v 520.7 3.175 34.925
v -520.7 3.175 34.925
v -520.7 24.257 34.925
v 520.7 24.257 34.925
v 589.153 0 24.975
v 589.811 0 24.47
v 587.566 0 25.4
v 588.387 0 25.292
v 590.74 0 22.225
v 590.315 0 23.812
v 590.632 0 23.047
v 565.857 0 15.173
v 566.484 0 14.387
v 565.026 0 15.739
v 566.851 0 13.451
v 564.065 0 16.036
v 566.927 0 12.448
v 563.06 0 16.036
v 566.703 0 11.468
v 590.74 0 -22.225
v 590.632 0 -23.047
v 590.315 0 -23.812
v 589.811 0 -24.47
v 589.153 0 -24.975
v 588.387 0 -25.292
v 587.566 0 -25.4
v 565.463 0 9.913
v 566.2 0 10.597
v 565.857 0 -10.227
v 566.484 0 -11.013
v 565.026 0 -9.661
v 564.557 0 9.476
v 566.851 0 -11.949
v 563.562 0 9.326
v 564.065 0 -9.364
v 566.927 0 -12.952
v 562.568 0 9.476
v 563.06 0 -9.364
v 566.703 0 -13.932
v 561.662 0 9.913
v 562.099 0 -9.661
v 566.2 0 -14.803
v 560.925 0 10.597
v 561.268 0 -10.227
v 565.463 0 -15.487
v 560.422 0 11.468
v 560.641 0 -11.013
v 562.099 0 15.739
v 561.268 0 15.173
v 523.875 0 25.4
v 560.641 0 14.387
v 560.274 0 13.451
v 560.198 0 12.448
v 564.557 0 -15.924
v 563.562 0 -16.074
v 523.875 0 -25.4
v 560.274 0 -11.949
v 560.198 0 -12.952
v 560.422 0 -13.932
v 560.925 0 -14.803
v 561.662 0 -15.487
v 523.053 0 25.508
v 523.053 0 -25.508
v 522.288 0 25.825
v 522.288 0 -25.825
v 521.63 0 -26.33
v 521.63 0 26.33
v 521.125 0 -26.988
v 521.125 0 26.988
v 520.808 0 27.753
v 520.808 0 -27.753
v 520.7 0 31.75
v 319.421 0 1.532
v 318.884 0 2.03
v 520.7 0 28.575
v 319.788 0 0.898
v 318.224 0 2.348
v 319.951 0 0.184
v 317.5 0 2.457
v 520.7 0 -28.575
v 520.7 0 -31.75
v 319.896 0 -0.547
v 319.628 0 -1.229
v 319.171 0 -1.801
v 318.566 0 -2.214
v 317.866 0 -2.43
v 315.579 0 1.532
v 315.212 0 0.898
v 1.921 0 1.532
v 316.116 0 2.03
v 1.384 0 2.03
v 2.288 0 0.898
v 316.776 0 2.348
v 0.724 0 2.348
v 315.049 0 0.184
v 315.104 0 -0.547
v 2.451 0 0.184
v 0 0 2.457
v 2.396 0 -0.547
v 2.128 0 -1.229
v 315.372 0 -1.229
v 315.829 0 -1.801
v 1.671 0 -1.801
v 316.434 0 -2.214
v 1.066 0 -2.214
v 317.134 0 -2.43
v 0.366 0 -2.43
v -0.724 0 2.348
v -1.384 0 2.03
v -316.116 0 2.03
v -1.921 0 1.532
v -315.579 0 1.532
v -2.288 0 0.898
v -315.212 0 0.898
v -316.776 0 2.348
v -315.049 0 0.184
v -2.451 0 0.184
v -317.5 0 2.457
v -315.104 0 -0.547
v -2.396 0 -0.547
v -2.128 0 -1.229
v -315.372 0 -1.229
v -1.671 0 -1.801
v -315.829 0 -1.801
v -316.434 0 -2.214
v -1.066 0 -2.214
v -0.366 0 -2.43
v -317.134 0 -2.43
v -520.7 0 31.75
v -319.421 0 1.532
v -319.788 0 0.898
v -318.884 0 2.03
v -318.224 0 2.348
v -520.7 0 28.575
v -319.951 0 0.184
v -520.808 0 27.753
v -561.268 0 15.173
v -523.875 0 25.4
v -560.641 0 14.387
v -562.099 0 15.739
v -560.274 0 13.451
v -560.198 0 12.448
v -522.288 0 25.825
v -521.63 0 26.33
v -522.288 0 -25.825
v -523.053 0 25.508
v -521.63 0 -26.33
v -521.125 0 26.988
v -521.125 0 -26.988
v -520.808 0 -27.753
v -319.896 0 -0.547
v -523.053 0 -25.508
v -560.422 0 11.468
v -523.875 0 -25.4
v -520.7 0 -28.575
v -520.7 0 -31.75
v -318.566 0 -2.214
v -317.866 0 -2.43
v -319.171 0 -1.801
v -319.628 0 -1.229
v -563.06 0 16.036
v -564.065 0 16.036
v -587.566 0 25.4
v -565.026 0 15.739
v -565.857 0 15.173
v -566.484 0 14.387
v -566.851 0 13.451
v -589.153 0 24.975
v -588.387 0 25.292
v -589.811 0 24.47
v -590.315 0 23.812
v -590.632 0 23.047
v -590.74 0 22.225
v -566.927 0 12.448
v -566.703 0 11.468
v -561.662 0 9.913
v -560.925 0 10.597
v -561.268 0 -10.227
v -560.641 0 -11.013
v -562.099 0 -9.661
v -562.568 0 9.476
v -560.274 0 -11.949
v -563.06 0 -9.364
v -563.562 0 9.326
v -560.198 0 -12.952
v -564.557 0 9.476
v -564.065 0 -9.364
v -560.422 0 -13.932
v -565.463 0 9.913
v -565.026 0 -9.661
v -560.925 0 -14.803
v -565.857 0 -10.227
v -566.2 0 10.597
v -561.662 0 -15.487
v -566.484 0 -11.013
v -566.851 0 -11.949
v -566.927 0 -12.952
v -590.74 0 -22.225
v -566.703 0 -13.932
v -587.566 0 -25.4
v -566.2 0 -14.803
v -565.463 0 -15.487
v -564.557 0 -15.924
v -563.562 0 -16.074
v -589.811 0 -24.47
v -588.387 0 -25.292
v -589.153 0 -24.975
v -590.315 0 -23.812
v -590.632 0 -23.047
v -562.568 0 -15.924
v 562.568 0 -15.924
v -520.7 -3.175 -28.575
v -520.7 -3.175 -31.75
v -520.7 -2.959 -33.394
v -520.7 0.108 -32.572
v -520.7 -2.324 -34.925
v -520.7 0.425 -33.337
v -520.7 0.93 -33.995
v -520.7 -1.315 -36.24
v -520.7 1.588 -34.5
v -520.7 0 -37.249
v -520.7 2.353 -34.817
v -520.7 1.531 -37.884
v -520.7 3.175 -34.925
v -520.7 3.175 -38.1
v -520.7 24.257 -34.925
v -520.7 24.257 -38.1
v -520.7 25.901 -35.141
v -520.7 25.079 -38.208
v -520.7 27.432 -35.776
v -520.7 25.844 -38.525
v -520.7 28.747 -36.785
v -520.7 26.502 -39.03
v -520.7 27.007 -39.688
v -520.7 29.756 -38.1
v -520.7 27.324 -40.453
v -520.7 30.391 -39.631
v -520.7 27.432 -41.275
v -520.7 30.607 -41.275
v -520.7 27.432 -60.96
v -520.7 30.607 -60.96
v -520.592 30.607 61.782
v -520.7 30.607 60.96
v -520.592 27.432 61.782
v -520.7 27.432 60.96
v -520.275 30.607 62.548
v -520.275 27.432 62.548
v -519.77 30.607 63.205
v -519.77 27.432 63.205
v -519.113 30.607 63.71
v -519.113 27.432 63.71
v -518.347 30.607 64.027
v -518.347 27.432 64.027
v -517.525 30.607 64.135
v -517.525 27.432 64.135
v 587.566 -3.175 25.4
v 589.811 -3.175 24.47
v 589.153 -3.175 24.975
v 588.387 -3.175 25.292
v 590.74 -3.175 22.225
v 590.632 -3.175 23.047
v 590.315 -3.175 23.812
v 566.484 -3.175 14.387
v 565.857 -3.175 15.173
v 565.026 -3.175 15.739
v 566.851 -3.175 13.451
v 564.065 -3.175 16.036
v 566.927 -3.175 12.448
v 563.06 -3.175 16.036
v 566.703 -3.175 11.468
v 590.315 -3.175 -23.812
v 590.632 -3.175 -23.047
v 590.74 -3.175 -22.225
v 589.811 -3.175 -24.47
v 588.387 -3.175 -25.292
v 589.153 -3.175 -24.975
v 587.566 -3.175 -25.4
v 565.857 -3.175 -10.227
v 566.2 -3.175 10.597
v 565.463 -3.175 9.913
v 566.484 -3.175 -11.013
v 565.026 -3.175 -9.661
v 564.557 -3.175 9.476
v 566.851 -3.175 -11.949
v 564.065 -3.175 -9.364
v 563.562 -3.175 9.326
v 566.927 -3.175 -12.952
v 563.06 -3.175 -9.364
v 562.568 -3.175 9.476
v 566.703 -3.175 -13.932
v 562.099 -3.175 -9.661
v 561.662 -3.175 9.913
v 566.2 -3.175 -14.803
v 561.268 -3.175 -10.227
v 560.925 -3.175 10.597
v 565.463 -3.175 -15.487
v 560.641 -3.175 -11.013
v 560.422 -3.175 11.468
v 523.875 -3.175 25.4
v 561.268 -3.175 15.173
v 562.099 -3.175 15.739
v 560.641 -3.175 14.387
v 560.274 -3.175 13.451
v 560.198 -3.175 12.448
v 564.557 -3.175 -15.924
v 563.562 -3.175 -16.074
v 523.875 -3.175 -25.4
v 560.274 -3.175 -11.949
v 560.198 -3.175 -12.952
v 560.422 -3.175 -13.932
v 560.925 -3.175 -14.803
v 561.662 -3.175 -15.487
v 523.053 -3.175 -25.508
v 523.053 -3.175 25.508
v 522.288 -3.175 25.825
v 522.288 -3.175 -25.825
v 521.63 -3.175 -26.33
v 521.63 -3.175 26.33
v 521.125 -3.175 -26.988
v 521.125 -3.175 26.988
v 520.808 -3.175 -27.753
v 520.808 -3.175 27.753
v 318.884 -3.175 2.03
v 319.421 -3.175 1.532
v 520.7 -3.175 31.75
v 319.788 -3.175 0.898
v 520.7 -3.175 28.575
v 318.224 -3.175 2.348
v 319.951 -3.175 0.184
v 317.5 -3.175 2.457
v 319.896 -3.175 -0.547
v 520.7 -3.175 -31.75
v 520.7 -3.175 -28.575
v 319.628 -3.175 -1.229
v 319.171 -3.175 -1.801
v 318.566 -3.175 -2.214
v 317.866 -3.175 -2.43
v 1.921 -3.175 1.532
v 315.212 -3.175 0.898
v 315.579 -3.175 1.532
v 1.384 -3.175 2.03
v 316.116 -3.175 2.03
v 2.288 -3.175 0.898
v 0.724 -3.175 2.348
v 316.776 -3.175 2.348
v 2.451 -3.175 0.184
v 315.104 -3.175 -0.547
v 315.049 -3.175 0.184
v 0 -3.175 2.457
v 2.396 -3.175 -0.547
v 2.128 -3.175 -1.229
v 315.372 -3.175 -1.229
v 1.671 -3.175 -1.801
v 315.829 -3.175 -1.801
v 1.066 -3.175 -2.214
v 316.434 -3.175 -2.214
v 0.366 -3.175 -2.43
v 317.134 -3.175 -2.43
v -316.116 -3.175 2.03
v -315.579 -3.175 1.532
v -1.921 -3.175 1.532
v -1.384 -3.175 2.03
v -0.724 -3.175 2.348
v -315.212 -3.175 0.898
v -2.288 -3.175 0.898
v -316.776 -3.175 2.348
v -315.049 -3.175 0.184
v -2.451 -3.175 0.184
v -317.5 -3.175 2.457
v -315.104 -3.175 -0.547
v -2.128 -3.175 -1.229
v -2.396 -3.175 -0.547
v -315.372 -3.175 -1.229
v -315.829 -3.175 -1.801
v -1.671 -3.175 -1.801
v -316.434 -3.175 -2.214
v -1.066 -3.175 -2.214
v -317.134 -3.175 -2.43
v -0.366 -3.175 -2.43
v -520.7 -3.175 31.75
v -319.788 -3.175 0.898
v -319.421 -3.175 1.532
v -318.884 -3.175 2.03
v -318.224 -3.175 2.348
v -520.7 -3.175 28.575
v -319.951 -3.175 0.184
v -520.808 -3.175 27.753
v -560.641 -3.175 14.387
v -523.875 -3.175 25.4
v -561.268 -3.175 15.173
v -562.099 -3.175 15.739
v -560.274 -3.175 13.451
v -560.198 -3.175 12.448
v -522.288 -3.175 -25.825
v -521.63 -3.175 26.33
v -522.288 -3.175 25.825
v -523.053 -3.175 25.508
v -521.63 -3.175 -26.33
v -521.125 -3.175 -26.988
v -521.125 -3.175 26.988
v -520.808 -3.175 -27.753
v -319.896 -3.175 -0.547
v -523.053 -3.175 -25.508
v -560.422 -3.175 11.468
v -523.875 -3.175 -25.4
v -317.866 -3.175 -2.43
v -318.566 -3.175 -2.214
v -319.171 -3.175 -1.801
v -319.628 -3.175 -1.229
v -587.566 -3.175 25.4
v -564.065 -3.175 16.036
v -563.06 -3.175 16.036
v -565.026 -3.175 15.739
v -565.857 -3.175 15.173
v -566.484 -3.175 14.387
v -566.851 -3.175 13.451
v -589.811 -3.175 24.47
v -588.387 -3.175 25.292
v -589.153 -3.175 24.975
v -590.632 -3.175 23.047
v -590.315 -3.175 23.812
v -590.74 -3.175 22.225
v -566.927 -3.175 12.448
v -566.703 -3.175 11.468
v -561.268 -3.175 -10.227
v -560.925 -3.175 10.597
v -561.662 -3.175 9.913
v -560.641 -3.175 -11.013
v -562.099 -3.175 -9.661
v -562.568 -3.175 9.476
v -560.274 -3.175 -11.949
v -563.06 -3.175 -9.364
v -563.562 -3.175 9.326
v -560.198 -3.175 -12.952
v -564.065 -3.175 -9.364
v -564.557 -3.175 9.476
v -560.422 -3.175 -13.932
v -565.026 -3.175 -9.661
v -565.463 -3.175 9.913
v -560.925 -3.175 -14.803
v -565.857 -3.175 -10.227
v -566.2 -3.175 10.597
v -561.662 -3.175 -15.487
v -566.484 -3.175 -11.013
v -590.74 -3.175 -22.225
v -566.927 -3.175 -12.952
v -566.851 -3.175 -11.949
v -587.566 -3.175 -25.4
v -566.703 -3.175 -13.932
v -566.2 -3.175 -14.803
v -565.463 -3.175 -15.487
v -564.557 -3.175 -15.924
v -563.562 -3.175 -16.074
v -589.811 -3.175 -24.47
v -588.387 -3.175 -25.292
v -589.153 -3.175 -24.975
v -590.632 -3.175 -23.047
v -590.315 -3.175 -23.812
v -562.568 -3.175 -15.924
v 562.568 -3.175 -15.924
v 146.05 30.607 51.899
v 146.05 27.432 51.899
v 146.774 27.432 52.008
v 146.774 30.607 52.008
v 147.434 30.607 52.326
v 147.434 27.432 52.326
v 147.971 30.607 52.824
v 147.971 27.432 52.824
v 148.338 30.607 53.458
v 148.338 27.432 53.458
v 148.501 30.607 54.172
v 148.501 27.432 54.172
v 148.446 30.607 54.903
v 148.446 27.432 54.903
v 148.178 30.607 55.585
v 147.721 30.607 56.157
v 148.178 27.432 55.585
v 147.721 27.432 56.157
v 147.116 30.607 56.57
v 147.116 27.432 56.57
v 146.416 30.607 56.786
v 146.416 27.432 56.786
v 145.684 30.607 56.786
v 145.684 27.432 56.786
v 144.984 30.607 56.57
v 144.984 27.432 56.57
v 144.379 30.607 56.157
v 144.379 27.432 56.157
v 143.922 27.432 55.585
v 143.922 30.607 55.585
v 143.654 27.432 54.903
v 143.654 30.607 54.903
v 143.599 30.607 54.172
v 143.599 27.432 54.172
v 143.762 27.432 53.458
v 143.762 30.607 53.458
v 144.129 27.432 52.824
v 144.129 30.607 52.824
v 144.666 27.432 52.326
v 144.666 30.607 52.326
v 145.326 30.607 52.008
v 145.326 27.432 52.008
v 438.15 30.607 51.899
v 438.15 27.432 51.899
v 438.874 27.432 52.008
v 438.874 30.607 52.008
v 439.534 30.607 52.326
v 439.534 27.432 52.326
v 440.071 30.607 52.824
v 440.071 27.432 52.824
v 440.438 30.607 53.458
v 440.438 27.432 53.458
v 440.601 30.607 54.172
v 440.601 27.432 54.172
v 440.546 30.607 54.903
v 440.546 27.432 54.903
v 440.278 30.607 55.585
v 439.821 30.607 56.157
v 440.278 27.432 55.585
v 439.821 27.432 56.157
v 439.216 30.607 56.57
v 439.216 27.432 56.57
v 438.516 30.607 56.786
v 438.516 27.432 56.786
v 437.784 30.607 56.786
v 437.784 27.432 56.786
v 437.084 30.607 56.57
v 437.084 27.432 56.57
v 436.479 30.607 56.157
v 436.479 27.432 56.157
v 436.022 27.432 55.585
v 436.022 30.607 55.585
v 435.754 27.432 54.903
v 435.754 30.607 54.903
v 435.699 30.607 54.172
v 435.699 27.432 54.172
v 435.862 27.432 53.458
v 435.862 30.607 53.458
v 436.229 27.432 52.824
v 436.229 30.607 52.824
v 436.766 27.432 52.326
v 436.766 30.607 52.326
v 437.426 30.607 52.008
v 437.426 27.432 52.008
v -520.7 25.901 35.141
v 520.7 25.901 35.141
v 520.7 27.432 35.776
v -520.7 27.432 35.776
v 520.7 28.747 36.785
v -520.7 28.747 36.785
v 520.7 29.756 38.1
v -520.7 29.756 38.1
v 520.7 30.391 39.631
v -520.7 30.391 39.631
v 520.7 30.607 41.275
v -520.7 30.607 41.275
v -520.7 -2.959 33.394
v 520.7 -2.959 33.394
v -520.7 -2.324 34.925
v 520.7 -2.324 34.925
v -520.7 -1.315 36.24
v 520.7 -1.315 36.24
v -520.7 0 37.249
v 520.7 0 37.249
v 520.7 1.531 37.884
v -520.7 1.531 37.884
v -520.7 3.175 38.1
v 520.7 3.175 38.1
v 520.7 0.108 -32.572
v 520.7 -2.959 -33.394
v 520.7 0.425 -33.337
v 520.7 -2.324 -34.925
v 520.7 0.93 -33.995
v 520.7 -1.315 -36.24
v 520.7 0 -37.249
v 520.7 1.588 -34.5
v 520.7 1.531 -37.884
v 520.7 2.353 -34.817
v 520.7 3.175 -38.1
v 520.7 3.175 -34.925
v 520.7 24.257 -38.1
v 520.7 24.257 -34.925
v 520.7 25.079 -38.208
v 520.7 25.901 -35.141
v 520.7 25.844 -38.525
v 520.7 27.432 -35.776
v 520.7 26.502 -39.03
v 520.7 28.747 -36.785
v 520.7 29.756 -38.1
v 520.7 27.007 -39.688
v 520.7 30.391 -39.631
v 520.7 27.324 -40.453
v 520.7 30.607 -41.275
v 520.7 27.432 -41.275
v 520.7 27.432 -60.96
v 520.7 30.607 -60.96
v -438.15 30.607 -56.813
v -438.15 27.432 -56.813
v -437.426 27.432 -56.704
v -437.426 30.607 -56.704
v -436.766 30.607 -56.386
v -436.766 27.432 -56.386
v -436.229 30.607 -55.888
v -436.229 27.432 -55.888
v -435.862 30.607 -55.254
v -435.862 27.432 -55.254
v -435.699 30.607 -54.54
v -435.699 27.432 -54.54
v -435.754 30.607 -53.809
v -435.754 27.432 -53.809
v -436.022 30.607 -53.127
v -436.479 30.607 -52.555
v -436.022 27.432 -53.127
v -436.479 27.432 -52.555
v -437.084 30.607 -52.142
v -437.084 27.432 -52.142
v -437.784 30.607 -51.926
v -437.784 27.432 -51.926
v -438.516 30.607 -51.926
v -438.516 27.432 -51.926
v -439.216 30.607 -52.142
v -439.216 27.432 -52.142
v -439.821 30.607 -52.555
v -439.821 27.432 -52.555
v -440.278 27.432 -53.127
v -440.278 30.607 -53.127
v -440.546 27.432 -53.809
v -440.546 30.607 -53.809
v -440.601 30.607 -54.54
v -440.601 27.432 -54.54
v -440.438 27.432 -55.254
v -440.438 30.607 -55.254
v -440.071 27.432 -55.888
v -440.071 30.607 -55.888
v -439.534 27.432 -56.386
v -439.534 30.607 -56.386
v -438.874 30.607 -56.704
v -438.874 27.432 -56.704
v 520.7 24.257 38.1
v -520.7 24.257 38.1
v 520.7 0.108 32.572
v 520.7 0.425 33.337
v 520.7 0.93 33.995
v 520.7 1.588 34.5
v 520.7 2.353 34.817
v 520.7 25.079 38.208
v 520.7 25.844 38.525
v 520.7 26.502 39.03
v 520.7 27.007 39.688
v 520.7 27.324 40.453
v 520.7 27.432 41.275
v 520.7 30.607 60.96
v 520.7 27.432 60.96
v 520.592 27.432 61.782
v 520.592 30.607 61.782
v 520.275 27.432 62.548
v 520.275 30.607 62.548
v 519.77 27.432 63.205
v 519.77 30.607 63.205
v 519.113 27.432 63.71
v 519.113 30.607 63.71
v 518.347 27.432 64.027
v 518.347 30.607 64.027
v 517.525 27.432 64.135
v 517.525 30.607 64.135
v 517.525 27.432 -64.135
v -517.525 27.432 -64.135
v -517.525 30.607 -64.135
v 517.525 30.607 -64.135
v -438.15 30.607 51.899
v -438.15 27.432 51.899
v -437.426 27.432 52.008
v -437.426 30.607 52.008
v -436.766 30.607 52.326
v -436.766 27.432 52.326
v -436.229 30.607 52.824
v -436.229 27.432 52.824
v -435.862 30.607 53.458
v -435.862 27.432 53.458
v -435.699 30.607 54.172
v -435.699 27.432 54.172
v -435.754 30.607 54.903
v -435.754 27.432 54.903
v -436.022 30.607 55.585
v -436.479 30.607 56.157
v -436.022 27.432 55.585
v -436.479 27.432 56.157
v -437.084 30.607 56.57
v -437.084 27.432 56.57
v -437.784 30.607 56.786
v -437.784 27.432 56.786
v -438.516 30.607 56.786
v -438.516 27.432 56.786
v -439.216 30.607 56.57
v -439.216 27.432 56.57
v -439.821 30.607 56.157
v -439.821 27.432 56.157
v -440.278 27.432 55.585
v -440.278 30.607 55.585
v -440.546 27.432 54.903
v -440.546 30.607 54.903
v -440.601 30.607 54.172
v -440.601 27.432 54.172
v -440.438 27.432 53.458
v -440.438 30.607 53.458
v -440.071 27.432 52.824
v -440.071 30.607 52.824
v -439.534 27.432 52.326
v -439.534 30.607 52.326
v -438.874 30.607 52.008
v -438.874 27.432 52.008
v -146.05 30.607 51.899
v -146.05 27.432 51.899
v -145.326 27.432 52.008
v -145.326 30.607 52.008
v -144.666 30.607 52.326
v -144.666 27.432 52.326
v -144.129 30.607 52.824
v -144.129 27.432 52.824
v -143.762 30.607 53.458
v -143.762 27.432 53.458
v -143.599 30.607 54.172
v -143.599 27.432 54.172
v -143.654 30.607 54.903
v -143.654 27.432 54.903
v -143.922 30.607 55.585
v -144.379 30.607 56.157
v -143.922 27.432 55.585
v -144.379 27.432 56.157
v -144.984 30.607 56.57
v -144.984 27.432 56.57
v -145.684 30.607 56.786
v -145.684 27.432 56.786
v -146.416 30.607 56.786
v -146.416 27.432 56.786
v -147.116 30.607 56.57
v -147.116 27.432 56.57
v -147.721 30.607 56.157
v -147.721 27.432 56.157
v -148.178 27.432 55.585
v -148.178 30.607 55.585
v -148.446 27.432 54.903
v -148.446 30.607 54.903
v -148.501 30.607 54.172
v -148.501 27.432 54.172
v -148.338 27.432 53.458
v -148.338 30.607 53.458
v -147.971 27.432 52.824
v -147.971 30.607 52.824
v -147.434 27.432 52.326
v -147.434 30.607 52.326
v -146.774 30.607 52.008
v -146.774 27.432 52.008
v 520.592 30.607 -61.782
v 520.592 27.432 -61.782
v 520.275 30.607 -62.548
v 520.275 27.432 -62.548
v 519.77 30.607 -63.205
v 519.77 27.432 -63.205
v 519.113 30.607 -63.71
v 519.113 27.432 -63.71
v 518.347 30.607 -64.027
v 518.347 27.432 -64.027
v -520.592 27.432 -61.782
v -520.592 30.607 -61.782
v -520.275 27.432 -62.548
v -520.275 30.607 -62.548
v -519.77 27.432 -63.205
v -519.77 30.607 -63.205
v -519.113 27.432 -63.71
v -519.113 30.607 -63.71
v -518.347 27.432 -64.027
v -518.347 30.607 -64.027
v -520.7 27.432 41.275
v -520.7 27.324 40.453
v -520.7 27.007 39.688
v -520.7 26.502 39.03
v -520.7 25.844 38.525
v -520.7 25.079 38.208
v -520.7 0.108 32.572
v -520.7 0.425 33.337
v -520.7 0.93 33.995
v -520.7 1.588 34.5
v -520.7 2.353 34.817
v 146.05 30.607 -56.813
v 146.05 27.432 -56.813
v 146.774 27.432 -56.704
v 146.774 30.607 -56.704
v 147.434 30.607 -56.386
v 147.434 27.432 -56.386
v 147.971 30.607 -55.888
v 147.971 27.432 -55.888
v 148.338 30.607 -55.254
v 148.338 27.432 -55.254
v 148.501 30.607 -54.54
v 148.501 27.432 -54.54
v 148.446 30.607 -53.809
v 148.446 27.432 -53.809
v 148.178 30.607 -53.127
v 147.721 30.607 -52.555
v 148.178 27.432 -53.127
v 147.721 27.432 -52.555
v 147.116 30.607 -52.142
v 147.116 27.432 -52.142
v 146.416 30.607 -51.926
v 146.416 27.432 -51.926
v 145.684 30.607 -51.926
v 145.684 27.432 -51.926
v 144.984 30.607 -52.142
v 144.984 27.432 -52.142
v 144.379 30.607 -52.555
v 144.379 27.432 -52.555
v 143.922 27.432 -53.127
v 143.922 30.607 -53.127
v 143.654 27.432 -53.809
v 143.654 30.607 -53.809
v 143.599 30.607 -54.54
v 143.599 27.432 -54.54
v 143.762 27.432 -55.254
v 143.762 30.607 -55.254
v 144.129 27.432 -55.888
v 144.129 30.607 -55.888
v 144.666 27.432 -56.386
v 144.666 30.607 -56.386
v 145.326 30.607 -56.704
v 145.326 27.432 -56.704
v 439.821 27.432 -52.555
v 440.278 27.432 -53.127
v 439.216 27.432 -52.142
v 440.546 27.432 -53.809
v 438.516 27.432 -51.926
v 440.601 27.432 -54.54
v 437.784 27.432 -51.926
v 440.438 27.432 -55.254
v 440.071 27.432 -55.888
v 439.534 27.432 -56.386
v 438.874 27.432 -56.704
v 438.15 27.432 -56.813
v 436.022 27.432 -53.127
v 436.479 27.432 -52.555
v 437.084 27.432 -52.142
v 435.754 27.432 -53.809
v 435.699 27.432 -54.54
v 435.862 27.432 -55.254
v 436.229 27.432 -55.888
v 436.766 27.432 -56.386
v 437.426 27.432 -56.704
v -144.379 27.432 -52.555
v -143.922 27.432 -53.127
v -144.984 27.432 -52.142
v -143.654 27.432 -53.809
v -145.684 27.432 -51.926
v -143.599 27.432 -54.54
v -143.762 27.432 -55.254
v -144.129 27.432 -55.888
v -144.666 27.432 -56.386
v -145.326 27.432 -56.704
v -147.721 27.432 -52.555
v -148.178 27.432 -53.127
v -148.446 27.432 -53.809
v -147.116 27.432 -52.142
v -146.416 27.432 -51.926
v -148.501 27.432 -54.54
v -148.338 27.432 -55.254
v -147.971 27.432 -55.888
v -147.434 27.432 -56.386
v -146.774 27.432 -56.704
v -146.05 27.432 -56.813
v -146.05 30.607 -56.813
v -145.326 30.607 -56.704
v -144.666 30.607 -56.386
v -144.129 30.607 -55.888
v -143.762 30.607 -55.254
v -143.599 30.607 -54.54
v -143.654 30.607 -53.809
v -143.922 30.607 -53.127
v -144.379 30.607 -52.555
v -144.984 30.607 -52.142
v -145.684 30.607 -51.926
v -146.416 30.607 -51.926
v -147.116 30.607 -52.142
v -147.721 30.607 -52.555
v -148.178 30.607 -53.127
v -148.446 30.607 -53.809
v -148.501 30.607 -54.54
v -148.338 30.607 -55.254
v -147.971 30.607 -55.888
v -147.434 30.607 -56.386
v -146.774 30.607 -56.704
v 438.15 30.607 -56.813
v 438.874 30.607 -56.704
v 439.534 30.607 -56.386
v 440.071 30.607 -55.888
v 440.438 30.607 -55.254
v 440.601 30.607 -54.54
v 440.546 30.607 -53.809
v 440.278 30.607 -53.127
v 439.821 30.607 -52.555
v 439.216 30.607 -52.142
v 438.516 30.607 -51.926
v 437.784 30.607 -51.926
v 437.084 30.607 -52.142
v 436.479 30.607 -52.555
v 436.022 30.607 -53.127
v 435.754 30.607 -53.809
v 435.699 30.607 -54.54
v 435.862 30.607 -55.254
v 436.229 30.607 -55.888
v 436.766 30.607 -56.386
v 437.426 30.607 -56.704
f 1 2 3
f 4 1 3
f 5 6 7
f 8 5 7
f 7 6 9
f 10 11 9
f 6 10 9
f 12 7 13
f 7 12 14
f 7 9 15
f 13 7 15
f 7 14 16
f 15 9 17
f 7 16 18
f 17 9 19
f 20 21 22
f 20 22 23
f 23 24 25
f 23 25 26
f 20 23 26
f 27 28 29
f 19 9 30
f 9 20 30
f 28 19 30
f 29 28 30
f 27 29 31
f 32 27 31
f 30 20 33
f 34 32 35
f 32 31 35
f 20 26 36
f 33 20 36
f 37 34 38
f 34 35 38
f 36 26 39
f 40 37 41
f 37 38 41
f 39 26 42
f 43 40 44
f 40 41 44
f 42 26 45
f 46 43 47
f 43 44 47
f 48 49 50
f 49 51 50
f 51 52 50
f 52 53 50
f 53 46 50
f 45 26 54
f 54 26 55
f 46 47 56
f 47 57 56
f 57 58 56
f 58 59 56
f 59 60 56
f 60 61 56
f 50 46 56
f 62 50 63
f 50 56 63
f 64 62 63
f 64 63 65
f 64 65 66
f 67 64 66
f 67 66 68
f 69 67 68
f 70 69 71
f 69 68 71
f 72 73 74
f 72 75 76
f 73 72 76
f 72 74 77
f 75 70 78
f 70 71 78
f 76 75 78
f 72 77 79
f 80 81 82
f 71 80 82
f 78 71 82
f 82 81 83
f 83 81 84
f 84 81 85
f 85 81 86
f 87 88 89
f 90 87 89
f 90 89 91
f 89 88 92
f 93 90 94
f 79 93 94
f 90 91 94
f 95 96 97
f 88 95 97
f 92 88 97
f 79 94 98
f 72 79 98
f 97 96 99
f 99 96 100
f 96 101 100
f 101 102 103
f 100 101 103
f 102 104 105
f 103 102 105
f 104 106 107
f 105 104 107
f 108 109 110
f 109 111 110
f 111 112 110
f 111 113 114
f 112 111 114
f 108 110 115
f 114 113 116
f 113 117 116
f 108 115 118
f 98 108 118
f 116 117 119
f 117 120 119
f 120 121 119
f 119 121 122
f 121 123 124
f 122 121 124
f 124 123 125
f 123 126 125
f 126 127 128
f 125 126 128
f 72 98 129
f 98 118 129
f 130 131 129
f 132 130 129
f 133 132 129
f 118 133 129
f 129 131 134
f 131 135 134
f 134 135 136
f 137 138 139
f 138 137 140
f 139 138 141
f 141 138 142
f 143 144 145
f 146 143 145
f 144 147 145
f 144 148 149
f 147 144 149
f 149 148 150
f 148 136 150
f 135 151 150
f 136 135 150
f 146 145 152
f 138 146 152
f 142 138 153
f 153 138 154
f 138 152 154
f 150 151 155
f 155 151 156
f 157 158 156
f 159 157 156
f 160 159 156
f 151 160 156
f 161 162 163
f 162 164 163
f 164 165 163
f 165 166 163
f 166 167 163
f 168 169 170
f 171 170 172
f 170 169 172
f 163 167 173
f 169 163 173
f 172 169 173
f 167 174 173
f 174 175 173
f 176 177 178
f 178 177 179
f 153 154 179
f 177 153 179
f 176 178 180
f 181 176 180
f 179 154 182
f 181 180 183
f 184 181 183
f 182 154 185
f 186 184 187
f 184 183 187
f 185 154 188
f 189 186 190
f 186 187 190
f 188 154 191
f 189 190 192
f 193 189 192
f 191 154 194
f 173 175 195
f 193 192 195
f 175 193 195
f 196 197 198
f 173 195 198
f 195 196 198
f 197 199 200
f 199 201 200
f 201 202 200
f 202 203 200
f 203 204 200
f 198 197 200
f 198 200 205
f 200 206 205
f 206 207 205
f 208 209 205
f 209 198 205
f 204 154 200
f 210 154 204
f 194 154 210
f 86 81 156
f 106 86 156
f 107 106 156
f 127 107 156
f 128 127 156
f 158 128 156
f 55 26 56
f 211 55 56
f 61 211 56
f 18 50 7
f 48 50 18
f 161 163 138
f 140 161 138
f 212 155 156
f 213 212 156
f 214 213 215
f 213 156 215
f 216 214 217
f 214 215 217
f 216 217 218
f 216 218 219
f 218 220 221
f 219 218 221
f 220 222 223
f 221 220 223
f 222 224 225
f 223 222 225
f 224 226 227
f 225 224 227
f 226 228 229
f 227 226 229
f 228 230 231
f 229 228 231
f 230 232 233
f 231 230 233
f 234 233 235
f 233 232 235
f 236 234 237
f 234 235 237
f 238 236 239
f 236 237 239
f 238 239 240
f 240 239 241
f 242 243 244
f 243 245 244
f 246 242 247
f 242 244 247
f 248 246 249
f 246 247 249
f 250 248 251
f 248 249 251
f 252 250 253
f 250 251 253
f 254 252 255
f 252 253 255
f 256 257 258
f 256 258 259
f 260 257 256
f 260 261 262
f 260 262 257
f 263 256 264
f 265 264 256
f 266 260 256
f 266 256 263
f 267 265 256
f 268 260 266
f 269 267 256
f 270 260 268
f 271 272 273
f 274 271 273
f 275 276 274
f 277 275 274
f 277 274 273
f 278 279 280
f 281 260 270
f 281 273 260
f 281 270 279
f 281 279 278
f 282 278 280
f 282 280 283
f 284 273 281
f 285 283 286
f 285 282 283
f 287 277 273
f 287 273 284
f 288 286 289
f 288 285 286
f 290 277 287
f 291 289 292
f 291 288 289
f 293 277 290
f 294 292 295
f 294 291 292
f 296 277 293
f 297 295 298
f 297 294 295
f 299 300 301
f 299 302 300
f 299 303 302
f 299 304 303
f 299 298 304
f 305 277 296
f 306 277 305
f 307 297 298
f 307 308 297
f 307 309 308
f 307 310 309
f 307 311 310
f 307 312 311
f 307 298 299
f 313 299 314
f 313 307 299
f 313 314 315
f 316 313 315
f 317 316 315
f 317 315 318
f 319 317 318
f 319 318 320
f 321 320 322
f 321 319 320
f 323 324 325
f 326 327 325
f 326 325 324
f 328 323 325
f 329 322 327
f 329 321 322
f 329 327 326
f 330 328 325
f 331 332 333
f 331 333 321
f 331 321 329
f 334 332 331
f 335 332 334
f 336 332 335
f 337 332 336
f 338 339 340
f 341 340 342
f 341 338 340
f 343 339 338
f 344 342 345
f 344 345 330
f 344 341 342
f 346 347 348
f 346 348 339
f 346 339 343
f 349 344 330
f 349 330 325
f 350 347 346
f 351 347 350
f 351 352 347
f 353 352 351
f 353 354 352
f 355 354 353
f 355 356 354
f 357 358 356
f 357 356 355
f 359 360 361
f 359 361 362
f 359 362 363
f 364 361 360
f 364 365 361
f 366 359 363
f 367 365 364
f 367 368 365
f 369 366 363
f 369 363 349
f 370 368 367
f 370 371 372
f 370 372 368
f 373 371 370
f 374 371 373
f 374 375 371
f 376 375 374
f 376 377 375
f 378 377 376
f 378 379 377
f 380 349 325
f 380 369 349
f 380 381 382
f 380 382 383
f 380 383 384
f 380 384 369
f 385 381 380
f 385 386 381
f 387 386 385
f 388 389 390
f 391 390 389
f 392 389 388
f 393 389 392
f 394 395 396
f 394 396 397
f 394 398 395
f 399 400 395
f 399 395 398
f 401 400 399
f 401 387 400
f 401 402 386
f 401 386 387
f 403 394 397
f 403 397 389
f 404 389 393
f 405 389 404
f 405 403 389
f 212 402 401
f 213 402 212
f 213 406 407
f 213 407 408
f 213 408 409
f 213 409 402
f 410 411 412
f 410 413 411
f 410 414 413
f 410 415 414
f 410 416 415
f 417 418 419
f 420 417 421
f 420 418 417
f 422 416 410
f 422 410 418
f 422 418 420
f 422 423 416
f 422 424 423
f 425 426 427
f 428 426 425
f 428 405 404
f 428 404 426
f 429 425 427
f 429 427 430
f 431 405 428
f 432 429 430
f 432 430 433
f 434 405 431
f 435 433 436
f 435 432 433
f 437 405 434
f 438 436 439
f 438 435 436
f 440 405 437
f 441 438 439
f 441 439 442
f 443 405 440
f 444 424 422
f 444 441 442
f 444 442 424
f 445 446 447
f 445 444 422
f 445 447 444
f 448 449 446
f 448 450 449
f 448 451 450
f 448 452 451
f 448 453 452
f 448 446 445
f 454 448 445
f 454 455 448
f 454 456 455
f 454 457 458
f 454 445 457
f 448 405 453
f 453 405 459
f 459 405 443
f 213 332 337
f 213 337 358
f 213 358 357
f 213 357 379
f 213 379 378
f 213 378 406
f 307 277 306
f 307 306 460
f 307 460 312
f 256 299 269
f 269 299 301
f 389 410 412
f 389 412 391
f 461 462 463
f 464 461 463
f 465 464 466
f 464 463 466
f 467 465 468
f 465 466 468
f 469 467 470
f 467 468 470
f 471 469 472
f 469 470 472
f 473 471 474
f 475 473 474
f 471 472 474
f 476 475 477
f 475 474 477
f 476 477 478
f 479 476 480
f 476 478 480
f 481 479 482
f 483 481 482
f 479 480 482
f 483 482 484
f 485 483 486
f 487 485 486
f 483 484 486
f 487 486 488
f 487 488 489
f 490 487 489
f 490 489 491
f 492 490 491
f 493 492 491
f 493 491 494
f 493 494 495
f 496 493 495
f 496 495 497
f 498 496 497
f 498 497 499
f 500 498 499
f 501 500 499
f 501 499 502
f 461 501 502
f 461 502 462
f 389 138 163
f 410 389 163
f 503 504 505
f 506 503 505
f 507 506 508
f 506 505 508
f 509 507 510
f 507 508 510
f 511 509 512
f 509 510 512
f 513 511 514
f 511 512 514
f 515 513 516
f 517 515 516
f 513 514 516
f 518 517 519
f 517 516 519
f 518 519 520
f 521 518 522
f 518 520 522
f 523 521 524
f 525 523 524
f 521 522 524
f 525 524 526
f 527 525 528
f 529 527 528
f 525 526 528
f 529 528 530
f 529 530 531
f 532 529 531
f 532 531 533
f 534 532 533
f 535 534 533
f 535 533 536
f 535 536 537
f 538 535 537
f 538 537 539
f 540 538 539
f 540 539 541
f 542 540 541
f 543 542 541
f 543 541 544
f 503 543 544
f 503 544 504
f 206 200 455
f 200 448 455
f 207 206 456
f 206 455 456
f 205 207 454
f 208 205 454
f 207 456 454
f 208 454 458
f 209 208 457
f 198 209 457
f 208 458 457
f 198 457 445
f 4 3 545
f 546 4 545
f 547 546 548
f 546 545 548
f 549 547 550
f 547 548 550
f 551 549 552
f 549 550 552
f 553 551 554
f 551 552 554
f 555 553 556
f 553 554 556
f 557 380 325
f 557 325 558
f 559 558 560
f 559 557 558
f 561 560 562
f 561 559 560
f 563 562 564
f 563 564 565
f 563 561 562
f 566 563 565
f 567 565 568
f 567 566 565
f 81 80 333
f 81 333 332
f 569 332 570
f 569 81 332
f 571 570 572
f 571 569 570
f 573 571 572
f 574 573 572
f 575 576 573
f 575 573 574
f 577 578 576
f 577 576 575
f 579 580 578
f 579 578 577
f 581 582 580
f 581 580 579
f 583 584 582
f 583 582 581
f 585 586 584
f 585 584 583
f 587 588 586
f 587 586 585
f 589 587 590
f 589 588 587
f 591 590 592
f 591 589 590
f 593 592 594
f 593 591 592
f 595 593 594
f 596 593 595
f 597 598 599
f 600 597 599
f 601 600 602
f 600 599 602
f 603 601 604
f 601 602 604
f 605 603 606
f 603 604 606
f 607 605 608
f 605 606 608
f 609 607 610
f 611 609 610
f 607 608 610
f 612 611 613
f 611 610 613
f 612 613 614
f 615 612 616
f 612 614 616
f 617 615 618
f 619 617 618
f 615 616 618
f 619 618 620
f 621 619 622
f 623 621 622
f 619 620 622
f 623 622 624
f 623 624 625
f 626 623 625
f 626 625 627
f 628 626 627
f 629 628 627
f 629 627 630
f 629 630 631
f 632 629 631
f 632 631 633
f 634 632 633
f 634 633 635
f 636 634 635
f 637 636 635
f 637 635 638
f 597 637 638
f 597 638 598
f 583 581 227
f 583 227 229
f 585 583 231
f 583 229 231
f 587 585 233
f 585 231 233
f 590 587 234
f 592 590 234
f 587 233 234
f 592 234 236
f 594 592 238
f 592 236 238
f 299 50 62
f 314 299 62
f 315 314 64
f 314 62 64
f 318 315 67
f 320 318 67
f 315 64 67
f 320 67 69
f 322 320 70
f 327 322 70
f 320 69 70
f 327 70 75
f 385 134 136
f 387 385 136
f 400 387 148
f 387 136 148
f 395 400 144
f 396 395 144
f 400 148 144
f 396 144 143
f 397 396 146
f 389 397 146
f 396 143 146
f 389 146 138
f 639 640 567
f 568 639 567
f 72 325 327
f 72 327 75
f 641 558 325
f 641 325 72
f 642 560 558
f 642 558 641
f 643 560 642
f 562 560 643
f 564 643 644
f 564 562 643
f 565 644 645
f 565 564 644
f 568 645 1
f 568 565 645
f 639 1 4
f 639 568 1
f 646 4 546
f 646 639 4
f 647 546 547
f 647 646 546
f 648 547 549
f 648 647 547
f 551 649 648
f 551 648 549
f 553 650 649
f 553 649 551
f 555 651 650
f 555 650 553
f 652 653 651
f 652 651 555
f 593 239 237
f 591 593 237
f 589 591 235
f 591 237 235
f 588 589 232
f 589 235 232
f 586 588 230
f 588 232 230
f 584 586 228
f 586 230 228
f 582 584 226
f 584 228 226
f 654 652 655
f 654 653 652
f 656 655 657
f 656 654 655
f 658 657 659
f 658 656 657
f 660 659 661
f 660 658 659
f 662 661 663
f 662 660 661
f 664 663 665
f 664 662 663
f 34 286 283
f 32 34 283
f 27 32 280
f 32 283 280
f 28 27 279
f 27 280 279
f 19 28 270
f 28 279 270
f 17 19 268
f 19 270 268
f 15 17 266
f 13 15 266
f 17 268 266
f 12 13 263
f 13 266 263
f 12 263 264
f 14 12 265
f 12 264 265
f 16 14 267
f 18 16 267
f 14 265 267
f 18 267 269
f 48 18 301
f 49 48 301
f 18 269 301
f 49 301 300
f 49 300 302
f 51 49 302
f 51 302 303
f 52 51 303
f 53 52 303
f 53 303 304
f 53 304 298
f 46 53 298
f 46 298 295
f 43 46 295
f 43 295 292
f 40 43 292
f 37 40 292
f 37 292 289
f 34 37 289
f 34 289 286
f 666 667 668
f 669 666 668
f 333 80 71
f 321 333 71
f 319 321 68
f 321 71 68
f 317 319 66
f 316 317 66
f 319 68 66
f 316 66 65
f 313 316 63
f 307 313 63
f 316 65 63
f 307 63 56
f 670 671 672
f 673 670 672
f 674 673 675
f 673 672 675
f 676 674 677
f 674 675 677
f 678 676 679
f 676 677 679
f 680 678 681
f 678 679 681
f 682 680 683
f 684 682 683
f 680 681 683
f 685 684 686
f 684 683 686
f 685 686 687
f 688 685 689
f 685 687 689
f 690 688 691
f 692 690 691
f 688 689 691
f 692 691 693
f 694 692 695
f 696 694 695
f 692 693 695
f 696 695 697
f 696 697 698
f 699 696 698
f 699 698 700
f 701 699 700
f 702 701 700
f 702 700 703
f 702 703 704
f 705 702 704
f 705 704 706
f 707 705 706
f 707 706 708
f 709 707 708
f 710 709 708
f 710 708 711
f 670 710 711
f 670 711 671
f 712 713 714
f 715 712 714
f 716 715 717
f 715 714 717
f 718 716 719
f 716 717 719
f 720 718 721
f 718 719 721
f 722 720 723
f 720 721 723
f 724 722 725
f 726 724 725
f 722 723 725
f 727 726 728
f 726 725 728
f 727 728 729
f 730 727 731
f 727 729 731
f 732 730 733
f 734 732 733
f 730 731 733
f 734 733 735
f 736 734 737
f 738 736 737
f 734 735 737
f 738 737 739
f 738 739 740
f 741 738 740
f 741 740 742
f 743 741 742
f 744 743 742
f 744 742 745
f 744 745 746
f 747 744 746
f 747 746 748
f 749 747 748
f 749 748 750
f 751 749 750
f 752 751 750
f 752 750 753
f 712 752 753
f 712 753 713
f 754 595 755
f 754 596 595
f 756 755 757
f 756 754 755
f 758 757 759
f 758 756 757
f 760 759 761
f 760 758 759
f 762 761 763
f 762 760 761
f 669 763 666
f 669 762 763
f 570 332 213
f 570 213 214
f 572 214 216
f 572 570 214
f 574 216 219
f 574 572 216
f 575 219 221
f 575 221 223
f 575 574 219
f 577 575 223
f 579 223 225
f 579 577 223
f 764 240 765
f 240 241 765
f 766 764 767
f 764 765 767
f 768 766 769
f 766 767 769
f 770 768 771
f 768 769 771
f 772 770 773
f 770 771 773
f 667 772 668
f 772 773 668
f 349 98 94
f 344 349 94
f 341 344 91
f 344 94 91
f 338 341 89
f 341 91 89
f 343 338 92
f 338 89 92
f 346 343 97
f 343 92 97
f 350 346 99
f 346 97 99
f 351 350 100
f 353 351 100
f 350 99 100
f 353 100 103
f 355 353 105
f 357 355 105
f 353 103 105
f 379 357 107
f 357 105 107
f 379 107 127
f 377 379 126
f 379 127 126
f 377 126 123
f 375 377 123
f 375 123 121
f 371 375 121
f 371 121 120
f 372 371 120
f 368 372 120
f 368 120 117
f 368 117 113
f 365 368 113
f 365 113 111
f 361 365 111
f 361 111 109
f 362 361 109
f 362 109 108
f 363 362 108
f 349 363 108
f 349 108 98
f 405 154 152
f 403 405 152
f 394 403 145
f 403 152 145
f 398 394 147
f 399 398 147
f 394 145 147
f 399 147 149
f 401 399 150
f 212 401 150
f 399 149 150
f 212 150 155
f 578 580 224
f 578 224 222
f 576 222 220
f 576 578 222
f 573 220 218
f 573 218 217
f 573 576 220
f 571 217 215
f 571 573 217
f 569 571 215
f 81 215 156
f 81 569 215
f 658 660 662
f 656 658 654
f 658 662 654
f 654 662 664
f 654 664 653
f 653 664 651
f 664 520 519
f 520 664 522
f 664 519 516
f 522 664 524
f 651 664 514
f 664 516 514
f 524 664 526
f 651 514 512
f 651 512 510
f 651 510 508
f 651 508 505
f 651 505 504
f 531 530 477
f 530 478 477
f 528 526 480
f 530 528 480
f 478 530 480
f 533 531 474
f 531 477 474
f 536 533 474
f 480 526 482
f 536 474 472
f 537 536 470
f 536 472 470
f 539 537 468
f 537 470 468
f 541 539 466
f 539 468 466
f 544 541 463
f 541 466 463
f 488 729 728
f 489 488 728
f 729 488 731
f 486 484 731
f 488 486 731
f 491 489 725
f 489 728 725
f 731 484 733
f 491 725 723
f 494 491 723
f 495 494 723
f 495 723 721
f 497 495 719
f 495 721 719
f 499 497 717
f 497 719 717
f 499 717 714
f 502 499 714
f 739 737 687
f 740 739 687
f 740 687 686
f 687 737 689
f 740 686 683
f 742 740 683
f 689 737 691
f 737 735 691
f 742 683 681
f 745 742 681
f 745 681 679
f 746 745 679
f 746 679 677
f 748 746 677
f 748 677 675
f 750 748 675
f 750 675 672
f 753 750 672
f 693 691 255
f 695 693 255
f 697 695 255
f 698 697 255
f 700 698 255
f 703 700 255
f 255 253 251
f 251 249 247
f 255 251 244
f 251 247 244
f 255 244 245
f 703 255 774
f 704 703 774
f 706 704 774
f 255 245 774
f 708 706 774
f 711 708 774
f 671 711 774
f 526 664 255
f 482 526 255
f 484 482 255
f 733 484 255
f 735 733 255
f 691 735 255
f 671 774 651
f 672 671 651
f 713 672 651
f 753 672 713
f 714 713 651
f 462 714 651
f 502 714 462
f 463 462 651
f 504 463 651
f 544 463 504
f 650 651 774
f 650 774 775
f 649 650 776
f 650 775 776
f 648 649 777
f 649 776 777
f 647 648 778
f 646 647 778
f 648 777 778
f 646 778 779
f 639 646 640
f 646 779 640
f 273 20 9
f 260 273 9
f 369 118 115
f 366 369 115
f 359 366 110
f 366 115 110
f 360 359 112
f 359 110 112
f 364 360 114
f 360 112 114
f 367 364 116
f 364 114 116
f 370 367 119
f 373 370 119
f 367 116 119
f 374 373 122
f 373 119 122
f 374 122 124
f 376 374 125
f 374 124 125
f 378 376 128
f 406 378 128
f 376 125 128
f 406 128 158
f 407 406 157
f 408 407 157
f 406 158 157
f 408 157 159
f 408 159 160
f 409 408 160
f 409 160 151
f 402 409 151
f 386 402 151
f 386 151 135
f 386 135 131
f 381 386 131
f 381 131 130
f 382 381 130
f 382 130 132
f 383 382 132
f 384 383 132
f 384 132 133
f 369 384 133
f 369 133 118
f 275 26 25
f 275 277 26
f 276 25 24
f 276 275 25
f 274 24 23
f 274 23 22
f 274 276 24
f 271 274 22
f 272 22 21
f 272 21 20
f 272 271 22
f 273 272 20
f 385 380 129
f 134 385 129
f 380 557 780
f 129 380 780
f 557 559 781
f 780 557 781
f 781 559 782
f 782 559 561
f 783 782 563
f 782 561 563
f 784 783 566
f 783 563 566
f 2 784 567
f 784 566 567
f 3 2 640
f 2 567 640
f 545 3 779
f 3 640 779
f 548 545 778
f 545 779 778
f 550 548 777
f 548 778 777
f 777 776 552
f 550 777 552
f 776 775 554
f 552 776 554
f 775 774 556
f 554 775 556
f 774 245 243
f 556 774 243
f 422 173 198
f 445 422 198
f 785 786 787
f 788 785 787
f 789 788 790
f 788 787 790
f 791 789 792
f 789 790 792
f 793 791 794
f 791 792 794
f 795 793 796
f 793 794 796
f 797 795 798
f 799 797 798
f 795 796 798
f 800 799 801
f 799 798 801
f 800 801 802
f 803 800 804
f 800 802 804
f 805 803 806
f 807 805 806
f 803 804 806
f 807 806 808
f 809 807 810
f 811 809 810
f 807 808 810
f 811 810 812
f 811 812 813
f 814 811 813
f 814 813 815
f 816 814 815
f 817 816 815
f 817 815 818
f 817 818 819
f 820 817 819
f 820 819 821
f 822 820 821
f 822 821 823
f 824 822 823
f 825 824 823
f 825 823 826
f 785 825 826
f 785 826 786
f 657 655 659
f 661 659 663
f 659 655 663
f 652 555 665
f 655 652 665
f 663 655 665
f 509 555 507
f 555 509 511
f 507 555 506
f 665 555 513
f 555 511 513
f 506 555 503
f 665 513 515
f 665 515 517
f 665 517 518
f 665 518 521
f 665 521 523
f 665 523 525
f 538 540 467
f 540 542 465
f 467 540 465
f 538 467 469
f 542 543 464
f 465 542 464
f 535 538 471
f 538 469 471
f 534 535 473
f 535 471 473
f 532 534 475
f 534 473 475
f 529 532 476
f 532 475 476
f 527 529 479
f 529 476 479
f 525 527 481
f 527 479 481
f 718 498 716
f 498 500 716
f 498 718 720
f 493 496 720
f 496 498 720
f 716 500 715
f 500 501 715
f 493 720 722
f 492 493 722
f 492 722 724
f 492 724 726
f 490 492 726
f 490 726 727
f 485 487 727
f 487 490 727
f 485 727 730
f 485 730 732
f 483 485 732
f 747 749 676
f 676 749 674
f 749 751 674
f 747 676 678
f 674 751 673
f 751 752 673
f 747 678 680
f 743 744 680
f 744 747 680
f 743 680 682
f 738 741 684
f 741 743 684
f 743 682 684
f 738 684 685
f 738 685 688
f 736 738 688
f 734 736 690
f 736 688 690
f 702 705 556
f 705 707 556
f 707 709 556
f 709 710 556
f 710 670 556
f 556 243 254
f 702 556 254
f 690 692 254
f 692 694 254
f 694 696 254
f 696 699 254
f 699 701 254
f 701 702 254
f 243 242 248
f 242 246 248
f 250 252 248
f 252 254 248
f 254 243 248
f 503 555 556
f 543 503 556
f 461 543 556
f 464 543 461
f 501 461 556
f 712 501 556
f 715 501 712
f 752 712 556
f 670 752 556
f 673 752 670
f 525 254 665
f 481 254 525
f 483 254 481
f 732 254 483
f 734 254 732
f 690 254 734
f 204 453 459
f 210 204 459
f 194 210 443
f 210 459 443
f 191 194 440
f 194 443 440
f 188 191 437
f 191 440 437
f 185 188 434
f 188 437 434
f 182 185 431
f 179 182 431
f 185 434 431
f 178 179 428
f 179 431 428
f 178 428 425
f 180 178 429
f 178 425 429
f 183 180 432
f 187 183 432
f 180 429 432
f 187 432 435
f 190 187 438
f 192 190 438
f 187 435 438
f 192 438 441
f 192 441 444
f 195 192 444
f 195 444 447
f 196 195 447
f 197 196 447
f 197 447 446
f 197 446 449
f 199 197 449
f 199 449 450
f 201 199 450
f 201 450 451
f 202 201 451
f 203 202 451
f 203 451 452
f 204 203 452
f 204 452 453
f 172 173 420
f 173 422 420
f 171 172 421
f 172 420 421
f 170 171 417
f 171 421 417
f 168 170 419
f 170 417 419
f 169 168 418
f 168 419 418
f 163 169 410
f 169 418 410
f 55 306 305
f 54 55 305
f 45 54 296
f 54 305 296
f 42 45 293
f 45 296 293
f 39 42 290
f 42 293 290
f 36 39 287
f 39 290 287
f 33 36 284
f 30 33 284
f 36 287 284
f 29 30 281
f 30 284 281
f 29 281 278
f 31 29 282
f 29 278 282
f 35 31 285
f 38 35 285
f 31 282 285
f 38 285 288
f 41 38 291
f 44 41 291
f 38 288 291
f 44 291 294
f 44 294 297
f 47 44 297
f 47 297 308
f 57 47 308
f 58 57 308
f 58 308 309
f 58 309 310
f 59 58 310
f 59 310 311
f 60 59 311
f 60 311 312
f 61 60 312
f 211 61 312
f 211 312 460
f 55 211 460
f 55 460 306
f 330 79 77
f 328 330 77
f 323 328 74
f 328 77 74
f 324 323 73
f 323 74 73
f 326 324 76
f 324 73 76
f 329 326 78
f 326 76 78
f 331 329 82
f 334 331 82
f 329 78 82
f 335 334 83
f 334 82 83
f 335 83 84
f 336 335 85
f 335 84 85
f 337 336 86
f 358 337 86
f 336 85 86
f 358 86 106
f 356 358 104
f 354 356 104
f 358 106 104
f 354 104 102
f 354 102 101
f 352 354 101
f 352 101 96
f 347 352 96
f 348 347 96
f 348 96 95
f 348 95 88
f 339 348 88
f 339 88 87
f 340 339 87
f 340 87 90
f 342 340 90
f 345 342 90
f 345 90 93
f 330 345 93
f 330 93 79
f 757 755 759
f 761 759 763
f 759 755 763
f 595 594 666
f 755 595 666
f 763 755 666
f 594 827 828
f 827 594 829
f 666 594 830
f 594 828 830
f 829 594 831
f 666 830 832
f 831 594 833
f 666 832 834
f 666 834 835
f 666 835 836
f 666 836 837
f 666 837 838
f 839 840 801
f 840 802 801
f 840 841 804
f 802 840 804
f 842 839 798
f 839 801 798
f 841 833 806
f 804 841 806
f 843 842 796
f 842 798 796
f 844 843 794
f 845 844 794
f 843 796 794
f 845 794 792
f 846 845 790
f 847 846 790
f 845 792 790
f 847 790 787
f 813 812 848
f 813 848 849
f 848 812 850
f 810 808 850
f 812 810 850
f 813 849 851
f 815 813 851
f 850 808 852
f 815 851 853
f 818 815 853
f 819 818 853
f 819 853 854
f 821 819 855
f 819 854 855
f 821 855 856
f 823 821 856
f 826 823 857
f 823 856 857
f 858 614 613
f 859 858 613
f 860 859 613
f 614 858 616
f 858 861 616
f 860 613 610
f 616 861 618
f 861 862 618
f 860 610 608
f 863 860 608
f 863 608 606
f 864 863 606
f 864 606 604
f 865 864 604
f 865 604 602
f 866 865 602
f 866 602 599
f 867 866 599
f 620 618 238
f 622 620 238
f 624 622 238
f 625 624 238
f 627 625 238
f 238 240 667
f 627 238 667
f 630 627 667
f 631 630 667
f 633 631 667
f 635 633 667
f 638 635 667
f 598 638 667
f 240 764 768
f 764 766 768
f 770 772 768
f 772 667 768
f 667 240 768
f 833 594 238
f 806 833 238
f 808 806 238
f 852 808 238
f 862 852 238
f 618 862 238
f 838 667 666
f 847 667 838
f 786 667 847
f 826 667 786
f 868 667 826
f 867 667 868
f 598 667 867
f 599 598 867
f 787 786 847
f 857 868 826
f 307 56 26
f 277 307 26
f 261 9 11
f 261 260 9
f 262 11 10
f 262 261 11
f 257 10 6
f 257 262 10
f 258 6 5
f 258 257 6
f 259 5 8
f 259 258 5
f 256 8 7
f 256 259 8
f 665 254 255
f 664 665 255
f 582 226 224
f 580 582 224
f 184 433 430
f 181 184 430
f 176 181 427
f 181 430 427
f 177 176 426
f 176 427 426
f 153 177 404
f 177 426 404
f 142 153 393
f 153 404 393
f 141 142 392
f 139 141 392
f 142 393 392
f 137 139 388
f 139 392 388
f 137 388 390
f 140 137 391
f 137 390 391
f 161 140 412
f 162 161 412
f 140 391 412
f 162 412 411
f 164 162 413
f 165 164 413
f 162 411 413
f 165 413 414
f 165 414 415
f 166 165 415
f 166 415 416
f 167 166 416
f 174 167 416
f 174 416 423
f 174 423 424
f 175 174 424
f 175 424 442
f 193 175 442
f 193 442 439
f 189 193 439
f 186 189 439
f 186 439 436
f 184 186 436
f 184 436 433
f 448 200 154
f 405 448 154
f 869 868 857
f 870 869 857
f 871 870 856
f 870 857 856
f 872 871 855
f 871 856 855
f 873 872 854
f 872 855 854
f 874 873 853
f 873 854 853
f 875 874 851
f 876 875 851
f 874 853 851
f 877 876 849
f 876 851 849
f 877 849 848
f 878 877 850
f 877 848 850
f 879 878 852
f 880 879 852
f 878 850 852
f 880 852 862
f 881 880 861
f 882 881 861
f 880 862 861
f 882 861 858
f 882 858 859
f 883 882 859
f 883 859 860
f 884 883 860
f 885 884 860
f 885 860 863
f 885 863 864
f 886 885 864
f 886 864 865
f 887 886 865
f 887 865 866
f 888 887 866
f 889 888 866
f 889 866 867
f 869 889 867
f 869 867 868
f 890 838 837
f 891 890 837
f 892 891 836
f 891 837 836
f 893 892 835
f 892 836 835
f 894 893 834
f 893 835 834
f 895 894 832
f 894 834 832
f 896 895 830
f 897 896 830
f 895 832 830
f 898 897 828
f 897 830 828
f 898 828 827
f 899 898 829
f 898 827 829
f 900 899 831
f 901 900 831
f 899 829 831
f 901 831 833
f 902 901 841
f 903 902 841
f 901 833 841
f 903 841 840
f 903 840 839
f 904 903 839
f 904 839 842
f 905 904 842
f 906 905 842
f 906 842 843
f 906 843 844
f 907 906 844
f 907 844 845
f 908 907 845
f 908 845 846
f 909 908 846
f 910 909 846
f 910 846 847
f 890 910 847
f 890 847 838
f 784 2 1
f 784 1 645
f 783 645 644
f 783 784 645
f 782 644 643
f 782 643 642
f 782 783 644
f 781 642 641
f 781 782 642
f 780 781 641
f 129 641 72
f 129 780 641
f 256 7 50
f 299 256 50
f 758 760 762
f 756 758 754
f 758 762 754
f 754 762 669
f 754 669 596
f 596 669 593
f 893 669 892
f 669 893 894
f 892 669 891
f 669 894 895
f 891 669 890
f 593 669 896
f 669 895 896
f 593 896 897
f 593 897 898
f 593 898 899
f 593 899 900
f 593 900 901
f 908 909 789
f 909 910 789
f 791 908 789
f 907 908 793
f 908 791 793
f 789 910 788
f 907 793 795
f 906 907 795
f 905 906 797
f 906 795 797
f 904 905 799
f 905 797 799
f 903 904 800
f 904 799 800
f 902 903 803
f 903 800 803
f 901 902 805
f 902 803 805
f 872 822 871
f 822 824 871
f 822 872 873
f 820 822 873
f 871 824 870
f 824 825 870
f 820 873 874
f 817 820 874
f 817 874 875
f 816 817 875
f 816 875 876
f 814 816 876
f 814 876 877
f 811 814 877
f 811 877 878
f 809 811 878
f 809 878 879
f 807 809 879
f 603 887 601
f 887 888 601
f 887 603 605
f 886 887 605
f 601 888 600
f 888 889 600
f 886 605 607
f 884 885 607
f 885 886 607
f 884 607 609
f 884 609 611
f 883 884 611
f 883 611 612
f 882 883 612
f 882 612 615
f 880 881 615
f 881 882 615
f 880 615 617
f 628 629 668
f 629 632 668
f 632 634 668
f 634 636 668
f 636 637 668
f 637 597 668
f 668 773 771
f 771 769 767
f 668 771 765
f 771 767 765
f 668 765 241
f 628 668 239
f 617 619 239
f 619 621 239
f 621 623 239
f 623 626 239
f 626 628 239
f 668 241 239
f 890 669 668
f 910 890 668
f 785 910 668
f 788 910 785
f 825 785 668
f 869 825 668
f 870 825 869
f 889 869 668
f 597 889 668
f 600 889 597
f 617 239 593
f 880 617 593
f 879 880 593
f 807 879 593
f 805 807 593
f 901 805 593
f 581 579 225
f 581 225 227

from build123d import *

# Parameters (mm, degrees)
BASE_FLANGE2_DEPTH                     = 3.175
EDGE_FLANGE1_STRIP_W                   = 19.05
EDGE_FLANGE1_STRIP_H                   = 3.175
EDGE_FLANGE1_STRIP_CUT_DEPTH           = 1041.4
EDGE_FLANGE1_STRIP_2_W                 = 19.05
EDGE_FLANGE1_STRIP_2_H                 = 3.175
EDGE_FLANGE1_STRIP_CUT_2_DEPTH         = 1041.4
EDGE_FLANGE1_DEPTH                     = 1041.4
EDGE_FLANGE1_BEND_DEPTH                = 1041.4
EDGE_FLANGE3_START                     = -520.7
EDGE_FLANGE3_DEPTH                     = 1041.4
F_10_0_1935_DIAMETER_HOLE1_D           = 4.9149
F_10_0_1935_DIAMETER_HOLE1_ON_FACE_2_D = 4.9149
F_10_0_1935_DIAMETER_HOLE1_ON_FACE_3_D = 4.9149
F_17_64_0_26563_DIAMETER_HOLE1_D       = 6.747002
FILLET1_R                              = 3.175


# Read off the part's stored shape, not the designer's step: Edge-Flange3
# Sheet-metal steps are written as plain solids
with BuildPart() as part:
    # Sketch1 → Base-Flange2 (new body)
    with BuildSketch(Plane(origin=(0, 0, 0), x_dir=(1, 0, 0), z_dir=(0, 1, 0))):
        with BuildLine():
            Line((-520.7, 28.575), (-520.7, 38.1))
            Line((-520.7, 38.1), (520.7, 38.1))
            Line((520.7, 38.1), (520.7, 28.575))
            ThreePointArc((520.7, 28.575), (521.62993597, 26.32993597), (523.875, 25.4))
            Line((523.875, 25.4), (590.7405, 25.4))
            Line((590.7405, 25.4), (590.7405, -25.4))
            Line((590.7405, -25.4), (523.875, -25.4))
            ThreePointArc((523.875, -25.4), (521.62993597, -26.32993597), (520.7, -28.575))
            Line((520.7, -28.575), (520.7, -38.1))
            Line((520.7, -38.1), (-520.7, -38.1))
            Line((-520.7, -38.1), (-520.7, -28.575))
            ThreePointArc((-520.7, -28.575), (-521.62993597, -26.32993597), (-523.875, -25.4))
            Line((-523.875, -25.4), (-590.7405, -25.4))
            Line((-590.7405, -25.4), (-590.7405, 25.4))
            Line((-590.7405, 25.4), (-523.875, 25.4))
            ThreePointArc((-523.875, 25.4), (-521.62993597, 26.32993597), (-520.7, 28.575))
        make_face()
    extrude(amount=-BASE_FLANGE2_DEPTH)

    # Edge-Flange1 strip (across the edge) → Edge-Flange1 strip cut (cut)
    with BuildSketch(Plane(origin=(-520.7, 0, 38.1), x_dir=(0, 0, -1), z_dir=(1, 0, 0))):
        with Locations((-3.175, -1.5875)):
            Rectangle(EDGE_FLANGE1_STRIP_W, EDGE_FLANGE1_STRIP_H)
    extrude(amount=EDGE_FLANGE1_STRIP_CUT_DEPTH, mode=Mode.SUBTRACT)

    # Edge-Flange1 strip 2 (across the edge) → Edge-Flange1 strip cut 2 (cut)
    with BuildSketch(Plane(origin=(520.7, 0, -38.1), x_dir=(0, 0, 1), z_dir=(-1, 0, 0))):
        with Locations((-3.175, -1.5875)):
            Rectangle(EDGE_FLANGE1_STRIP_2_W, EDGE_FLANGE1_STRIP_2_H)
    extrude(amount=EDGE_FLANGE1_STRIP_CUT_2_DEPTH, mode=Mode.SUBTRACT)

    # Edge-Flange1 section (across the edge) → Edge-Flange1 (add)
    with BuildSketch(Plane(origin=(-520.7, 0, 38.1), x_dir=(0, 0, -1), z_dir=(1, 0, 0))):
        with BuildLine():
            Line((0, 3.175), (0, 17.145))
            Line((0, 17.145), (3.175, 17.145))
            Line((3.175, 17.145), (3.175, 3.175))
            ThreePointArc((3.175, 3.175), (4.10493597, 0.92993597), (6.35, 0))
            Line((6.35, 0), (6.35, -3.175))
            ThreePointArc((6.35, -3.175), (1.859871939, -1.315128061), (0, 3.175))
        make_face()
    extrude(amount=EDGE_FLANGE1_DEPTH)

    # Edge-Flange1 section 2 (across the edge) → Edge-Flange1 bend (add)
    with BuildSketch(Plane(origin=(520.7, 0, -38.1), x_dir=(0, 0, 1), z_dir=(-1, 0, 0))):
        with BuildLine():
            Line((0, 3.175), (0, 17.145))
            Line((0, 17.145), (3.175, 17.145))
            Line((3.175, 17.145), (3.175, 3.175))
            ThreePointArc((3.175, 3.175), (4.10493597, 0.92993597), (6.35, 0))
            Line((6.35, 0), (6.35, -3.175))
            ThreePointArc((6.35, -3.175), (1.859871939, -1.315128061), (0, 3.175))
        make_face()
    extrude(amount=EDGE_FLANGE1_BEND_DEPTH)

    # Edge-Flange3 outline → Edge-Flange3 (add)
    with BuildSketch(Plane.YZ.offset(EDGE_FLANGE3_START)):
        with BuildLine():
            Line((24.257, 38.1), (17.145, 38.1))
            Line((17.145, 38.1), (17.145, 34.925))
            Line((17.145, 34.925), (24.257, 34.925))
            ThreePointArc((24.257, 34.925), (28.747128061, 36.784871939), (30.607, 41.275))
            Line((30.607, 41.275), (30.607, 64.135))
            Line((30.607, 64.135), (27.432, 64.135))
            Line((27.432, 64.135), (27.432, 41.275))
            ThreePointArc((27.432, 41.275), (26.50206403, 39.02993597), (24.257, 38.1))
        make_face()
        with BuildLine():
            Line((17.145, -38.1), (24.257, -38.1))
            ThreePointArc((24.257, -38.1), (26.50206403, -39.02993597), (27.432, -41.275))
            Line((27.432, -41.275), (27.432, -64.135))
            Line((27.432, -64.135), (30.607, -64.135))
            Line((30.607, -64.135), (30.607, -41.275))
            ThreePointArc((30.607, -41.275), (28.747128061, -36.784871939), (24.257, -34.925))
            Line((24.257, -34.925), (17.145, -34.925))
            Line((17.145, -34.925), (17.145, -38.1))
        make_face()
    extrude(amount=EDGE_FLANGE3_DEPTH)

    # #10 (0.1935) Diameter Hole1 (through all)
    with Locations(Plane(origin=(-317.5, -3.175, 0), x_dir=(0, 0, -1), z_dir=(0, -1, 0))):
        with Locations((0, 0), (0, 635), (0, 317.5)):
            Hole(F_10_0_1935_DIAMETER_HOLE1_D / 2)

    # #10 (0.1935) Diameter Hole1 on face 2 (through all)
    with Locations(Plane.ZX):
        with Locations((0, 0)):
            Hole(F_10_0_1935_DIAMETER_HOLE1_ON_FACE_2_D / 2)

    # #10 (0.1935) Diameter Hole1 on face 3 (through all)
    with Locations(Plane(origin=(-438.15, 30.607, -54.356), x_dir=(0, 0, 1), z_dir=(0, 1, 0))):
        with Locations((0, 0), (0, 292.1), (0, 584.2), (0, 876.3), (108.712, 0), (108.712, 292.1), (108.712, 584.2), (108.712, 876.3)):
            Hole(F_10_0_1935_DIAMETER_HOLE1_ON_FACE_3_D / 2)

    # 17/64 (0.26563) Diameter Hole1 (through all)
    with Locations(Plane(origin=(-563.5625, 0, -12.7), x_dir=(0, 0, 1), z_dir=(0, 1, 0))):
        with Locations((0, 0), (25.4, 0), (0, 1127.125), (25.4, 1127.125)):
            Hole(F_17_64_0_26563_DIAMETER_HOLE1_D / 2)

    # Fillet1
    fillet1_edges = [part.edges().sort_by_distance(p)[0] for p in [
        (520.7, 29.0195, 64.135),
        (-520.7, 29.0195, 64.135),
        (-520.7, 29.0195, -64.135),
        (520.7, 29.0195, -64.135),
        (590.7405, -1.5875, -25.4),
        (590.7405, -1.5875, 25.4),
        (-590.7405, -1.5875, 25.4),
        (-590.7405, -1.5875, -25.4),
    ]]
    fillet(fillet1_edges, radius=FILLET1_R)


solid = part.part
